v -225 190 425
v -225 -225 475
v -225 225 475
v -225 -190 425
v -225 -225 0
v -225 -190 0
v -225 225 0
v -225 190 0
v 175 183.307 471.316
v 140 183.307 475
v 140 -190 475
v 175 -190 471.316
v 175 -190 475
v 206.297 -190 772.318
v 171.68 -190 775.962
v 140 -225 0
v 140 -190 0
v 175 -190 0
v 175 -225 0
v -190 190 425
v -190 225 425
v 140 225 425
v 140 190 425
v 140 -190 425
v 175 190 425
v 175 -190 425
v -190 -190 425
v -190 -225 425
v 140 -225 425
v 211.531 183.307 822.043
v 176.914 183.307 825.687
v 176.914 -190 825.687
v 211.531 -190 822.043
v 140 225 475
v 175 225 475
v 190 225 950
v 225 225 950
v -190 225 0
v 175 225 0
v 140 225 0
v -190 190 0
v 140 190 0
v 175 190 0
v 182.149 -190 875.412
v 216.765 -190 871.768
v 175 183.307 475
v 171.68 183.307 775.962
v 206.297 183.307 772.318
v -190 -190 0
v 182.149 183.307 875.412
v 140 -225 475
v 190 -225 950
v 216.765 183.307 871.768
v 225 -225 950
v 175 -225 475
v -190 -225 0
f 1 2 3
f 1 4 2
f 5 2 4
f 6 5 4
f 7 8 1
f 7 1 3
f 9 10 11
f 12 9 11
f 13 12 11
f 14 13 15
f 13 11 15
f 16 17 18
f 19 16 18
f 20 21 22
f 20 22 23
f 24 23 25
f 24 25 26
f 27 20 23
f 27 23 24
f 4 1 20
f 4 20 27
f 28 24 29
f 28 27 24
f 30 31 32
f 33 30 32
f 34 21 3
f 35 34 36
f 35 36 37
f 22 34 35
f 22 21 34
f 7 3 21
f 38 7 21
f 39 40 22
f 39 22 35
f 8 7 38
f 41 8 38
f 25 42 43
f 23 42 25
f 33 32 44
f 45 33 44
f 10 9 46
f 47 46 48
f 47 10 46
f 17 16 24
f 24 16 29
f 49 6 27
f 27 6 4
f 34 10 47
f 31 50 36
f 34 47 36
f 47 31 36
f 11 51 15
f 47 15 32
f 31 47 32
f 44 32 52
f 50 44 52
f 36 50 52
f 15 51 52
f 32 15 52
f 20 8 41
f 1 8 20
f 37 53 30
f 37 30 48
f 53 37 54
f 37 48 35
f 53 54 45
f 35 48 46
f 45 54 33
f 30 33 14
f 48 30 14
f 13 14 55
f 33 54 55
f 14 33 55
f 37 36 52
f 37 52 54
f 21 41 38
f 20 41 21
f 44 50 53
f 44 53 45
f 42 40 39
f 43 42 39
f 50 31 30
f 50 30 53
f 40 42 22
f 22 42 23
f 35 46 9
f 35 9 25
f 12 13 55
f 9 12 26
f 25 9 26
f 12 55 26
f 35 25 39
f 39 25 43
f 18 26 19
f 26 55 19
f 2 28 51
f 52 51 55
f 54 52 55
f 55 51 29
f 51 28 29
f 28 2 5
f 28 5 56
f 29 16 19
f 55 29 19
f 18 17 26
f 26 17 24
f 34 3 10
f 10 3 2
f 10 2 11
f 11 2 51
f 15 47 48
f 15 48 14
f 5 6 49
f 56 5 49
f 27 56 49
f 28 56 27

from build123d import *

# Parameters (mm, degrees)
F0_W     = 450
F0_H     = 450
F1_DEPTH = 950
F2_W     = 50
F2_H     = 50
F2_W_2   = 330
F2_H_2   = 425
F3_DEPTH = 450.001
F4_W     = 380
F4_H     = 425
F5_DEPTH = 450.001
F6_W     = 373.3073347807
F6_H     = 50
F6_H_2   = 302.6243293636
F7_DEPTH = 134.2592361444


with BuildPart() as f1:
    # F0 (on Top) → F1 (new body)
    with BuildSketch(Plane.XY):
        Rectangle(F0_W, F0_H)
    extrude(amount=F1_DEPTH)

    # F2 (on face) → F3 (cut, through all)
    with BuildSketch(Plane.XZ.offset(225)):
        with Locations((200, 450)):
            Rectangle(F2_W, F2_H)
        Polygon((-225, 475), (140, 475), (190, 950), (-225, 950), align=None)
        Polygon((175, 475), (225, 475), (225, 950), align=None)
        with Locations((-25, 212.5)):
            Rectangle(F2_W_2, F2_H_2)
        with Locations((200, 212.5)):
            Rectangle(F2_W, F2_H_2)
    extrude(amount=-F3_DEPTH, mode=Mode.SUBTRACT)

    # F4 (on face) → F5 (cut, through all)
    with BuildSketch(Plane(origin=(-225, 0, 0), x_dir=(0, -1, 0), z_dir=(-1, 0, 0))):
        with Locations((0, 212.5)):
            Rectangle(F4_W, F4_H)
    extrude(amount=-F5_DEPTH, mode=Mode.SUBTRACT)

    # F6 (on face) → F7 (cut, through all)
    with BuildSketch(Plane(origin=(89.0136986301, 0, -9.3698630137), x_dir=(0, -1, 0), z_dir=(-0.9945054529, 0, 0.1046847845))):
        with Locations((3.3463326097, 864.6702893338)):
            Rectangle(F6_W, F6_H)
        with Locations((3.3463326097, 638.358124652)):
            Rectangle(F6_W, F6_H_2)
    extrude(amount=-F7_DEPTH, mode=Mode.SUBTRACT)


solid = f1.part
